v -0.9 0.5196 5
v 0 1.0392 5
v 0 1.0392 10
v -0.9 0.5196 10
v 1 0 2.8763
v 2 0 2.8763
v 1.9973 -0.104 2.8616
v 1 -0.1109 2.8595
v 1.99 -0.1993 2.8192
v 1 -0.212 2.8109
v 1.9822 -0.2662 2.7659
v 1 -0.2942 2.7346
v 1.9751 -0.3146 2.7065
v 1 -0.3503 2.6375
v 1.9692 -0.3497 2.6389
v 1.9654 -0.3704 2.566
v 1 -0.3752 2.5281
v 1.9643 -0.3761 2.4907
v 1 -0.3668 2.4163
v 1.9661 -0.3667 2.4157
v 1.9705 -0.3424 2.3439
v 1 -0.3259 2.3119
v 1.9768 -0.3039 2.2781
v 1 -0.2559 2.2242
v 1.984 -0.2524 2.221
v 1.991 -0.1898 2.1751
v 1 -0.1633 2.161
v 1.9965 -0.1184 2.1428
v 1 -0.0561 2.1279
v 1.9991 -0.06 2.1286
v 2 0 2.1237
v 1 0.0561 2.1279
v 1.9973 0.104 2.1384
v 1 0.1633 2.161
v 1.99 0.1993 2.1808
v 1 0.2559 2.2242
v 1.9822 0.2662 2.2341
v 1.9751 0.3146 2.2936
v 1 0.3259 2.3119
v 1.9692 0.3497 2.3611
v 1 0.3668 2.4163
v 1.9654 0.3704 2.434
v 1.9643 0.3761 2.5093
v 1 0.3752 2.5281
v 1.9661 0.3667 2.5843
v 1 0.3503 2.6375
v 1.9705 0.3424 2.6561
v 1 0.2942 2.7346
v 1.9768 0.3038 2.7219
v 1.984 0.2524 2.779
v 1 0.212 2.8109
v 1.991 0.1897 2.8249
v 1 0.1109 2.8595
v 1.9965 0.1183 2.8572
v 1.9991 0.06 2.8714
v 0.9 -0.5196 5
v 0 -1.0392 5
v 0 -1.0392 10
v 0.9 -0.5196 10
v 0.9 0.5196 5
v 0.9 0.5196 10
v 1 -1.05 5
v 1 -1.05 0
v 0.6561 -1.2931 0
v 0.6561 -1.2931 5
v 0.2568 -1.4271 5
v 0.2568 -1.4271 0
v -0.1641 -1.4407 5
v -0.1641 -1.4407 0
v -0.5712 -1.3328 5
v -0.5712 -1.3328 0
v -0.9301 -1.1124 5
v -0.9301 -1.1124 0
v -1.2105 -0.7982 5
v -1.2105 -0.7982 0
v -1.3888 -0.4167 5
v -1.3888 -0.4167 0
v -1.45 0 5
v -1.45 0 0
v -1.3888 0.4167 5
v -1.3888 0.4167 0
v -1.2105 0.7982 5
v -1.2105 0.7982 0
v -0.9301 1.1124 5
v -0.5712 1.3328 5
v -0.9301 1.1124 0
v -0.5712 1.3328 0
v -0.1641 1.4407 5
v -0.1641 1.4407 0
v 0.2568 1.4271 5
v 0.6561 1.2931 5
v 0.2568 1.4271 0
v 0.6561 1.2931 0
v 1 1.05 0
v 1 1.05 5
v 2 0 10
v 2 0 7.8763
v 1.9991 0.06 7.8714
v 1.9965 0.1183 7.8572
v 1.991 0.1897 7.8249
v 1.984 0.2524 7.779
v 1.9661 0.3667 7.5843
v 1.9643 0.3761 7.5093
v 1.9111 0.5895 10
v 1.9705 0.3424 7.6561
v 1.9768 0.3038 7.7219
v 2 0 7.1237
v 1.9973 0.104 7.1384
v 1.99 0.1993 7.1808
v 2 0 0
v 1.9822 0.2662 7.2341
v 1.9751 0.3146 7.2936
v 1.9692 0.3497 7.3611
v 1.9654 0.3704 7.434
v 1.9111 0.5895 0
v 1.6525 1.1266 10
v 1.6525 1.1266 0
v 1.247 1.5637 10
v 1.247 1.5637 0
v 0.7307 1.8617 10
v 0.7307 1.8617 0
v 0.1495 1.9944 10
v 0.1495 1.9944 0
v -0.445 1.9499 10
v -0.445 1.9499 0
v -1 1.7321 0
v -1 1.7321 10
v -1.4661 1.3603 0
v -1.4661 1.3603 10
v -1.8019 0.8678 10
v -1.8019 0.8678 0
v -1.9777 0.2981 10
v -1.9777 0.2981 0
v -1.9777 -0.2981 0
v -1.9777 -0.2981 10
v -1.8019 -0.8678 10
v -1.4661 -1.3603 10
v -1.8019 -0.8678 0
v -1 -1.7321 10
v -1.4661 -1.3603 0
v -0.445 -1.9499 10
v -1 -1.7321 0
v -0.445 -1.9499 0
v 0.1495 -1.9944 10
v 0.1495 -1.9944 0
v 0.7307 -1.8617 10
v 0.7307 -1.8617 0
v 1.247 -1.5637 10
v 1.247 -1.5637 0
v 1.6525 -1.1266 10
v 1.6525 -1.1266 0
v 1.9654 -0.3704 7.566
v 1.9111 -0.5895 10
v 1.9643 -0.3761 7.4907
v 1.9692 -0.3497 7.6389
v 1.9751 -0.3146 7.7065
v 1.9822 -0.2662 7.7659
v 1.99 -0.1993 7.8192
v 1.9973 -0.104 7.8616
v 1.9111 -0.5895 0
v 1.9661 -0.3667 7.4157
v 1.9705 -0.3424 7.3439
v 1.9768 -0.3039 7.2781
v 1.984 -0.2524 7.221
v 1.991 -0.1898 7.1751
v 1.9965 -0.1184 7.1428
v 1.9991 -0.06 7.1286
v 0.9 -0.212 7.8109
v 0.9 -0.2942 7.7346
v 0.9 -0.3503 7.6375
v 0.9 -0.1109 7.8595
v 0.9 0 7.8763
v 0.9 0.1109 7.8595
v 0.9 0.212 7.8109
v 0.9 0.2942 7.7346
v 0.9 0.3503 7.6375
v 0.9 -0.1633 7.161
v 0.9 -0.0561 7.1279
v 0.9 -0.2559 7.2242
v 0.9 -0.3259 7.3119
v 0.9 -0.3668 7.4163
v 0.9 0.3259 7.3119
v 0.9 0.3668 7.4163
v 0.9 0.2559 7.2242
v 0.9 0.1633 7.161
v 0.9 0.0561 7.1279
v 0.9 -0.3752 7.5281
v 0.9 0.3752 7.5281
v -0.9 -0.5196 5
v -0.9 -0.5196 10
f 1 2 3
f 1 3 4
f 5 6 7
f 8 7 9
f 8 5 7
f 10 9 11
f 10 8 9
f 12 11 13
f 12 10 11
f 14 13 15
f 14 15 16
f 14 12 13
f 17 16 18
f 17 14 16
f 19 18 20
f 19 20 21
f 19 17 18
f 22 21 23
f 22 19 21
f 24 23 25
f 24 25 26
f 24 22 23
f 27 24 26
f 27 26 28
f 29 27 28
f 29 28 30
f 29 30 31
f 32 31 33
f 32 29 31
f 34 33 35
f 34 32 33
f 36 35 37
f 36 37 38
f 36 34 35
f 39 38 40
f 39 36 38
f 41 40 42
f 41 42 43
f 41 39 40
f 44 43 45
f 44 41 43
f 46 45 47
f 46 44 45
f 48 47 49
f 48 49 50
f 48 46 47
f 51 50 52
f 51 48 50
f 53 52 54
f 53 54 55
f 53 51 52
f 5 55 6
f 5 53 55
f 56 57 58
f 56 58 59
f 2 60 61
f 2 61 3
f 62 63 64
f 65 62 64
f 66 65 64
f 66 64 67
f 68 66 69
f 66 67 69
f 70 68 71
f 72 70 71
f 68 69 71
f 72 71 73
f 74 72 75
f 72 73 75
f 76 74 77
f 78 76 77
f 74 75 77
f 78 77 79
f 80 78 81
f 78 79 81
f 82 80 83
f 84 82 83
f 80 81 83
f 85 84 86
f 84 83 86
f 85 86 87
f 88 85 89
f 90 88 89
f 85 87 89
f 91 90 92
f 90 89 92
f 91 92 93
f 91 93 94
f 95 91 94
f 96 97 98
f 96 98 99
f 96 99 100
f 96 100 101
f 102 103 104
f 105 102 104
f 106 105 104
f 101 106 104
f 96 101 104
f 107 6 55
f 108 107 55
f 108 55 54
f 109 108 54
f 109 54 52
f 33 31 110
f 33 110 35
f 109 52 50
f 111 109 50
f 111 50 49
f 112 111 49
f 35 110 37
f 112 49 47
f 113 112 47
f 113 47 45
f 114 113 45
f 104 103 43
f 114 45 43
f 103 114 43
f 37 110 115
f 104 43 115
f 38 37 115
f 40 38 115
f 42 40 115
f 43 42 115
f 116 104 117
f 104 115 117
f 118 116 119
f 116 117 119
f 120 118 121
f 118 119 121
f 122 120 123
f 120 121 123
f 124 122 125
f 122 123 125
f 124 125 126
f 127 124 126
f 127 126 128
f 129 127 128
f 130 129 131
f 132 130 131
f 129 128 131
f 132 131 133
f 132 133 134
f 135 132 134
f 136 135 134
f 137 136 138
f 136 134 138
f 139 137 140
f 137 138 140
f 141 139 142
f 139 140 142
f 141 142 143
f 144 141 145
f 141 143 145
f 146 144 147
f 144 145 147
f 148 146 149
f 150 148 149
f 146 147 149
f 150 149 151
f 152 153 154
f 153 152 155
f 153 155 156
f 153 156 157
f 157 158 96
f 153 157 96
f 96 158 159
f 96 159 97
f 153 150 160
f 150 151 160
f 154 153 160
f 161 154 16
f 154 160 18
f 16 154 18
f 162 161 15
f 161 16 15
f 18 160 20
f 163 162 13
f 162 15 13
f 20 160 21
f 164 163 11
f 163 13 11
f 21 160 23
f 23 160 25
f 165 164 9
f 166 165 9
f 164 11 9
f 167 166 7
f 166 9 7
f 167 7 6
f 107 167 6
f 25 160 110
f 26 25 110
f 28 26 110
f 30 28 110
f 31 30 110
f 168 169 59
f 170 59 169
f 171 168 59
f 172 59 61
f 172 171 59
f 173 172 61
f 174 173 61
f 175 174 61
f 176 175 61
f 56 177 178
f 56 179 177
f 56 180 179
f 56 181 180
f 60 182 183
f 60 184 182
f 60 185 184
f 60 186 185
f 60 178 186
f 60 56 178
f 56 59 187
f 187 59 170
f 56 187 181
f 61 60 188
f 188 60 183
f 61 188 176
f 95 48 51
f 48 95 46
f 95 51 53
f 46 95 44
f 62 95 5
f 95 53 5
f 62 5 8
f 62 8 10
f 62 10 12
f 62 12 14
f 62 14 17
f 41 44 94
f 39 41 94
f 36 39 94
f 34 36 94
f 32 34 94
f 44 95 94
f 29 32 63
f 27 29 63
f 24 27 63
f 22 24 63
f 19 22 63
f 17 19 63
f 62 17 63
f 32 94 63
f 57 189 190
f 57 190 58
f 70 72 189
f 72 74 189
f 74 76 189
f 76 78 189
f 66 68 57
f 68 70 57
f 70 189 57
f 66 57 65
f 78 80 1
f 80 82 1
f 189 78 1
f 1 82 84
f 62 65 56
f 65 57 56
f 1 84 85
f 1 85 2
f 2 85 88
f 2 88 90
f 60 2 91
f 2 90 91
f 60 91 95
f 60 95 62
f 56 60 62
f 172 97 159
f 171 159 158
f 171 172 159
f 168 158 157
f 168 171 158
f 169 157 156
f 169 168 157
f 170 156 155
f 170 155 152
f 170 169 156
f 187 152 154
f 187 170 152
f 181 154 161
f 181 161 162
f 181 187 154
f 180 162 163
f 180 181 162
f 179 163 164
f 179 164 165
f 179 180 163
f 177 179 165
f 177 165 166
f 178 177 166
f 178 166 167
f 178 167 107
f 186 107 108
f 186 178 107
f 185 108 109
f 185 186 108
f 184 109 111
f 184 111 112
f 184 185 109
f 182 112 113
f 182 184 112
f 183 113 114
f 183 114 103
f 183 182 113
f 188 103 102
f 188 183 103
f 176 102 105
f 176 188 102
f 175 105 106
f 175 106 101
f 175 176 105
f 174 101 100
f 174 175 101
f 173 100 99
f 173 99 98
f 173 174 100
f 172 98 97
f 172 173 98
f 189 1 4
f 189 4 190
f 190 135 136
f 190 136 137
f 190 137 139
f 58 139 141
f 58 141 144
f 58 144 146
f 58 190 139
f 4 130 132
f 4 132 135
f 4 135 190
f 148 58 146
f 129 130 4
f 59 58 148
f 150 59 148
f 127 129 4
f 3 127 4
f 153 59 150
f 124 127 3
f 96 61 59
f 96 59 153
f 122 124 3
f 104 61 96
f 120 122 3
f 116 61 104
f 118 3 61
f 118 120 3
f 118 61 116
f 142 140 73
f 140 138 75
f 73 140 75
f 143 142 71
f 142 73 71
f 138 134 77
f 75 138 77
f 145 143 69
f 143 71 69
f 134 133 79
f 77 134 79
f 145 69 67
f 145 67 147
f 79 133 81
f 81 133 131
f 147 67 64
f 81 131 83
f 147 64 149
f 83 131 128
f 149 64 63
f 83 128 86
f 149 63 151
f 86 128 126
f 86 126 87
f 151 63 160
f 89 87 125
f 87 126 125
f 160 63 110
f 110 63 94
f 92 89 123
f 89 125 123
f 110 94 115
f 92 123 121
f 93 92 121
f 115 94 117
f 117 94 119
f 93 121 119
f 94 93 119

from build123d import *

# Parameters (mm, degrees)
MOTORSKE_R      = 2
MOTOR_DEPTH     = 5
AXISSKE_R       = 2
AXIS_DEPTH      = 5
SCREWHOLESKE_R  = 0.376260287
SCREWHOLE_DEPTH = 11.392304845


with BuildPart() as part:
    # MotorSke → Motor (new body)
    with BuildSketch(Plane.XY):
        Circle(MOTORSKE_R)
        with BuildLine():
            Line((1, 1.05), (1, -1.05))
            ThreePointArc((1, -1.05), (-1.45, 0), (1, 1.05))
        make_face(mode=Mode.SUBTRACT)
    extrude(amount=MOTOR_DEPTH)

    # AxisSke → Axis (add)
    with BuildSketch(Plane.XY.offset(5)):
        Circle(AXISSKE_R)
        Polygon((0, -1.039230485), (0.9, -0.519615242), (0.9, 0.519615242), (0, 1.039230485), (-0.9, 0.519615242), (-0.9, -0.519615242), align=None, mode=Mode.SUBTRACT)
    extrude(amount=AXIS_DEPTH)

    # ScrewHoleSke → ScrewHole (cut, through all)
    with BuildSketch(Plane(origin=(0, 0, 0), x_dir=(0, 0, -1), z_dir=(1, 0, 0))):
        with Locations(Location((-7.5, 0, 0), (0, 0, 180))):
            Circle(SCREWHOLESKE_R)
        with Locations(Location((-2.5, 0, 0), (0, 0, 180))):
            Circle(SCREWHOLESKE_R)
    extrude(amount=SCREWHOLE_DEPTH, mode=Mode.SUBTRACT)


solid = part.part
